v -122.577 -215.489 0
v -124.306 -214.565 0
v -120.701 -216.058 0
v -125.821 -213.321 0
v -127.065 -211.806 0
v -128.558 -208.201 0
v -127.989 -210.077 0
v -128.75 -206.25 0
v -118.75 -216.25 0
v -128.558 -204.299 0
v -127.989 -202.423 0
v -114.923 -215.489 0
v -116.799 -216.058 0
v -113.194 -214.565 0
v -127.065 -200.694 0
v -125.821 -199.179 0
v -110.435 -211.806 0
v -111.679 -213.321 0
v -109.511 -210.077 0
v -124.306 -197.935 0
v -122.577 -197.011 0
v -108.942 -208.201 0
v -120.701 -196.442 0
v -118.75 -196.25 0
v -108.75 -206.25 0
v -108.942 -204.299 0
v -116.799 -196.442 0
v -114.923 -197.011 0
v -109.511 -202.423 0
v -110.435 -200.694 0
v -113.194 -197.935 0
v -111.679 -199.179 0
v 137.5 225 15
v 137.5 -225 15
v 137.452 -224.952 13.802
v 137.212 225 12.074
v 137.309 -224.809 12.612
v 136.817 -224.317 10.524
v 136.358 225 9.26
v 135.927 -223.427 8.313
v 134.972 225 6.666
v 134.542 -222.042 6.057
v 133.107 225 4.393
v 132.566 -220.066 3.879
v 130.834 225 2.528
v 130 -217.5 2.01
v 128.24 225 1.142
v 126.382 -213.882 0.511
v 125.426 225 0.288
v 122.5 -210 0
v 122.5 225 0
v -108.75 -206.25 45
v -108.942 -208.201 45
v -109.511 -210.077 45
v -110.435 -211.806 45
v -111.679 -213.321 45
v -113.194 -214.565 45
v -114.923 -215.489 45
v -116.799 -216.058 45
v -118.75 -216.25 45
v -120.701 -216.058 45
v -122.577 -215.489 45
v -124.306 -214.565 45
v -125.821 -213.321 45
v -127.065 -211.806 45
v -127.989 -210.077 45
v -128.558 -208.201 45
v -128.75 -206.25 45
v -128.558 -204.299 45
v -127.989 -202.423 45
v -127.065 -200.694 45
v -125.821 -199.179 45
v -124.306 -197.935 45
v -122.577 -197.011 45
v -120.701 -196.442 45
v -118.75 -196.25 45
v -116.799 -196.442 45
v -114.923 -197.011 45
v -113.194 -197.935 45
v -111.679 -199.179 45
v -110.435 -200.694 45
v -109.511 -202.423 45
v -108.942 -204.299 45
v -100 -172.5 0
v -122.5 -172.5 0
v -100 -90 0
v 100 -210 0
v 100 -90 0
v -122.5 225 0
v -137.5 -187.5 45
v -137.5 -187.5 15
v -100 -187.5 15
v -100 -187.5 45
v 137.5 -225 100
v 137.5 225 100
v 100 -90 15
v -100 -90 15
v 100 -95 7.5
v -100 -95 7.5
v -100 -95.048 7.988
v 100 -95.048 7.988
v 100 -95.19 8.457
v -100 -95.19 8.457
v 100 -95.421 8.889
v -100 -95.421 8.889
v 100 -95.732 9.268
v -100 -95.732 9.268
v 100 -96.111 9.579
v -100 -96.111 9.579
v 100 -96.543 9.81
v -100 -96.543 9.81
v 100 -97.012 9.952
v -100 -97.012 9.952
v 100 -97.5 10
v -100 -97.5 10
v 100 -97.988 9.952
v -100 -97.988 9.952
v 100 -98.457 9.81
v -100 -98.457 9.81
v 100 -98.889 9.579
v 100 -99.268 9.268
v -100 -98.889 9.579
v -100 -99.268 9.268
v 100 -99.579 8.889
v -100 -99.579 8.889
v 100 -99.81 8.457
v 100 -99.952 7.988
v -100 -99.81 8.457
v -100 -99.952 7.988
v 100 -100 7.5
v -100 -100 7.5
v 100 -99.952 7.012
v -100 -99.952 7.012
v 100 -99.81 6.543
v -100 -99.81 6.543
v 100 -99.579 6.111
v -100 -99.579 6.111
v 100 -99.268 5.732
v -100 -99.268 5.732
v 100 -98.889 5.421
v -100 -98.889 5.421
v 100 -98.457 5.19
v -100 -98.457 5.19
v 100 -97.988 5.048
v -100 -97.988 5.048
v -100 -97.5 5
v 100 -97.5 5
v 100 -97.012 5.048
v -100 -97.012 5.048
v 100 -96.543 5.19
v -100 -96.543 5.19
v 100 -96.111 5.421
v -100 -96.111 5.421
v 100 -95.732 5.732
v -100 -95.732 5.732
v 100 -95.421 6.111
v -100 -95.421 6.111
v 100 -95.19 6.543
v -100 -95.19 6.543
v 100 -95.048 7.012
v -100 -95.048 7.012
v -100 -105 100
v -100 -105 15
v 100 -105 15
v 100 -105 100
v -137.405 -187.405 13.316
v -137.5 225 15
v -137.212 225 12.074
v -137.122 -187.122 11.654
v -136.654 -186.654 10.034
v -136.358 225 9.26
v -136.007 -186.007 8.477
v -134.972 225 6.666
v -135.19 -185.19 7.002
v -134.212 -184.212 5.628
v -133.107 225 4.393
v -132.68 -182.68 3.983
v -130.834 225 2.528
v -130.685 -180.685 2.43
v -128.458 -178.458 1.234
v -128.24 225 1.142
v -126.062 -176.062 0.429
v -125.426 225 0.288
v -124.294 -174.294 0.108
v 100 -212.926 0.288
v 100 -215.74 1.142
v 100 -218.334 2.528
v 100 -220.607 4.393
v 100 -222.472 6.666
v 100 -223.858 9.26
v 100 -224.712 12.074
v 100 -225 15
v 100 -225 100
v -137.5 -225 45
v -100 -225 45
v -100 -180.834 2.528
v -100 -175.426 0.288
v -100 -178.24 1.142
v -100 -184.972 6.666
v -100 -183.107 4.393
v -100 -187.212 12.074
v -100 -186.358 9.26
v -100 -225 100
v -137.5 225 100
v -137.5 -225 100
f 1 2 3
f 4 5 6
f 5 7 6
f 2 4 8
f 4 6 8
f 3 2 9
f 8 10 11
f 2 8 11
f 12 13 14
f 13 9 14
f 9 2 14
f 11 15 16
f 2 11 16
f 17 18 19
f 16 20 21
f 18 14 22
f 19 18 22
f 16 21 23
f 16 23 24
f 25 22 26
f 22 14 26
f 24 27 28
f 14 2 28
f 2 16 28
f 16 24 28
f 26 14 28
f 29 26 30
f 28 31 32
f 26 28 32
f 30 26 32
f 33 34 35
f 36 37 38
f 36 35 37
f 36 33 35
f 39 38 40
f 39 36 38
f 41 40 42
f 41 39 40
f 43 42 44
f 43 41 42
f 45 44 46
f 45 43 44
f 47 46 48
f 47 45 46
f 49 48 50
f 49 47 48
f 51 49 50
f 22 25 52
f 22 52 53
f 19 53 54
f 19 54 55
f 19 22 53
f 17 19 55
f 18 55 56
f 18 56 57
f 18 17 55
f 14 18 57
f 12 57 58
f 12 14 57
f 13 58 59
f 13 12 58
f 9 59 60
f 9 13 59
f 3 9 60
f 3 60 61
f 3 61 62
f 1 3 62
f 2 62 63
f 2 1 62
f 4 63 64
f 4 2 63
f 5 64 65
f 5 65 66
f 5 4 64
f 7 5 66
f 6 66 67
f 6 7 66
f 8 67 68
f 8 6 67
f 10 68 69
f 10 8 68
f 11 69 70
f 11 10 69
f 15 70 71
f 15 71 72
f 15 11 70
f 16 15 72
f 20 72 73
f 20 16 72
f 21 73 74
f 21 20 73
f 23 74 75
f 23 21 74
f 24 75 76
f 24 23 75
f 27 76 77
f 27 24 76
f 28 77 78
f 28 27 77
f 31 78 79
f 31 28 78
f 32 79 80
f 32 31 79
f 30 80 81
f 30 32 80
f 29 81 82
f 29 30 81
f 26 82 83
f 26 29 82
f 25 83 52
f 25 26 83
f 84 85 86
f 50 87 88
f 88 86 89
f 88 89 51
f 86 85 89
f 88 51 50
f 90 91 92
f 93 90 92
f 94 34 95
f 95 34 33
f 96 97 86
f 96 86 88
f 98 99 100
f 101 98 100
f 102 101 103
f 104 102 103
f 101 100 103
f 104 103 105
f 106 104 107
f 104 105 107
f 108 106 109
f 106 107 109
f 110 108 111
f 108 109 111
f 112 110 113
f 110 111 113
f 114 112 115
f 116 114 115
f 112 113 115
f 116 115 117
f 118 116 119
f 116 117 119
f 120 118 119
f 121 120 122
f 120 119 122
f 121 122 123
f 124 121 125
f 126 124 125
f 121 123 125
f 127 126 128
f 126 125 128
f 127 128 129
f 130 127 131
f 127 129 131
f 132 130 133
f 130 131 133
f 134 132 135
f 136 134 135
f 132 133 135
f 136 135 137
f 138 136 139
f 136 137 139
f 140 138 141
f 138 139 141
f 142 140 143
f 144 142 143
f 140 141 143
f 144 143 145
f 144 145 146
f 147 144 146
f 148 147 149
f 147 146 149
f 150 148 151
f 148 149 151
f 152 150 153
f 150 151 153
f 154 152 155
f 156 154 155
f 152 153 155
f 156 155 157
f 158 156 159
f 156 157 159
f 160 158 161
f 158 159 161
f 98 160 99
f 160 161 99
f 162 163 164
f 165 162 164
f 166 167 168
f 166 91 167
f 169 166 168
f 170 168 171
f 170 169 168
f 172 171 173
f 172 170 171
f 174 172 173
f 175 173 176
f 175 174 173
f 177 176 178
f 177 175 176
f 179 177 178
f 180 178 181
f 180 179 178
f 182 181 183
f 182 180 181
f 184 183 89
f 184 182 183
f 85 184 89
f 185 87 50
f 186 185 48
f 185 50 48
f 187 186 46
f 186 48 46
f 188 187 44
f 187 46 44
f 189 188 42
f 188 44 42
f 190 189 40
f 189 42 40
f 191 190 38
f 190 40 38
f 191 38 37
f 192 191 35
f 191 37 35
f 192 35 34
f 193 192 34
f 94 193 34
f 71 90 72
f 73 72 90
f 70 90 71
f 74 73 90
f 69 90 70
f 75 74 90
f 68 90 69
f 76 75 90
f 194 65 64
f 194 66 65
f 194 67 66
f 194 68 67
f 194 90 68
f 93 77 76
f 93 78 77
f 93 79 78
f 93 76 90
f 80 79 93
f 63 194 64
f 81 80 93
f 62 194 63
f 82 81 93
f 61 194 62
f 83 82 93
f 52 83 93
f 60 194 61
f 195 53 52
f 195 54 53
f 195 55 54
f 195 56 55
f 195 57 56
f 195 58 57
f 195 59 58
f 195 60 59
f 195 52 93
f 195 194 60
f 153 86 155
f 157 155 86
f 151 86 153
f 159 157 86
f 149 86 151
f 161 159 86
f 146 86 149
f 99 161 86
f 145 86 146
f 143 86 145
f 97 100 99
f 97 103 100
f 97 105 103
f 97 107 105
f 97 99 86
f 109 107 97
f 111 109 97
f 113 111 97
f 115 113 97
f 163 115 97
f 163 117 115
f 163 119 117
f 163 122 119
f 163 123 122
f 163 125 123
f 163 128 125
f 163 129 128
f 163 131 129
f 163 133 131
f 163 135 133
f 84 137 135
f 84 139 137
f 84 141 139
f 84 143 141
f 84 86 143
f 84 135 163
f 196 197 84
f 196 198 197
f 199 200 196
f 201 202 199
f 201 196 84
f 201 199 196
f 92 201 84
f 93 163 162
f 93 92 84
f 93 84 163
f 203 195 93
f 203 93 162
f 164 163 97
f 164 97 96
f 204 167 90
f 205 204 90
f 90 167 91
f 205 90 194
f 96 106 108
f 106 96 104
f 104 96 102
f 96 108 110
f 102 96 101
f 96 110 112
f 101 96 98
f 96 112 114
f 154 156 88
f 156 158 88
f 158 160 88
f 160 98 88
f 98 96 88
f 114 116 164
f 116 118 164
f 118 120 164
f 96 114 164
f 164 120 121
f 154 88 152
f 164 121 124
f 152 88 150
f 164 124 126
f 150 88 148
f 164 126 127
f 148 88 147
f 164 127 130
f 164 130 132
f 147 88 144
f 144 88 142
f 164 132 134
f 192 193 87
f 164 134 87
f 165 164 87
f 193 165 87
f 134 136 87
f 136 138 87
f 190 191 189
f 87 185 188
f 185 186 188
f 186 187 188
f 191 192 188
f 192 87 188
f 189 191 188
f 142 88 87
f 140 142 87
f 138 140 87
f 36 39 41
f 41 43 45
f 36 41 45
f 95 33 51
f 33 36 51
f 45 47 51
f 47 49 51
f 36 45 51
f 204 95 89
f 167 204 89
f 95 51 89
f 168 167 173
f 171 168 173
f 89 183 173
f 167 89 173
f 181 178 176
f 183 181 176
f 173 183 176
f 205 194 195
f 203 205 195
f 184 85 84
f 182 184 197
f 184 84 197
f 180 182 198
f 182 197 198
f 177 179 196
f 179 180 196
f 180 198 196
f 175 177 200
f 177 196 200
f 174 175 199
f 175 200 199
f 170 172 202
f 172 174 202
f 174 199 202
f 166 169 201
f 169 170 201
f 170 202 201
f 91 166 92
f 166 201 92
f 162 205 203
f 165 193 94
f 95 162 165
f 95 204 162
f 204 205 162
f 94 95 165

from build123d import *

# Parameters (mm, degrees)
F1_DEPTH = 100
F2_W     = 37.5
F2_H     = 37.5
F2_R     = 10
F3_DEPTH = 45
F4_W     = 200
F4_H     = 15
F5_DEPTH = 15
F6_R     = 2.5
F7_DEPTH = 200
F8_R     = 15


# Not quite as in the source:
# - a feature of the source that left no trace in its solid (it failed there, or was rolled back) is left out


with BuildPart() as f1:
    # F0 (on Top) → F1 (new body)
    with BuildSketch(Plane.XY):
        Polygon((137.5, 225), (-137.5, 225), (-137.5, -225), (-100, -225), (-100, -105), (100, -105), (100, -225), (137.5, -225), align=None)
    extrude(amount=F1_DEPTH)

    # F2 (on face) → F3 (cut)
    with BuildSketch(Plane(origin=(0, 0, 0), x_dir=(1, 0, 0), z_dir=(0, 0, -1))):
        with Locations((-118.75, 206.25)):
            Rectangle(F2_W, F2_H)
        with Locations((-118.75, 206.25)):
            Circle(F2_R, mode=Mode.SUBTRACT)
    extrude(amount=-F3_DEPTH, mode=Mode.SUBTRACT)

    # F4 (on face) → F5 (cut)
    with BuildSketch(Plane.XZ.offset(105)):
        with Locations((0, 7.5)):
            Rectangle(F4_W, F4_H)
    extrude(amount=-F5_DEPTH, mode=Mode.SUBTRACT)

    # F6 (on face) → F7 (join)
    with BuildSketch(Plane.YZ.offset(-100)):
        with Locations((-97.5, 7.5)):
            Circle(F6_R)
    extrude(amount=F7_DEPTH)

    # F8
    f8_edges = [f1.edges().sort_by_distance(p)[0] for p in [
        (118.75, -225, 0),
        (137.5, 0, 0),
        (-137.5, 18.75, 0),
        (-118.75, -187.5, 0),
    ]]
    fillet(f8_edges, radius=F8_R)


solid = f1.part
